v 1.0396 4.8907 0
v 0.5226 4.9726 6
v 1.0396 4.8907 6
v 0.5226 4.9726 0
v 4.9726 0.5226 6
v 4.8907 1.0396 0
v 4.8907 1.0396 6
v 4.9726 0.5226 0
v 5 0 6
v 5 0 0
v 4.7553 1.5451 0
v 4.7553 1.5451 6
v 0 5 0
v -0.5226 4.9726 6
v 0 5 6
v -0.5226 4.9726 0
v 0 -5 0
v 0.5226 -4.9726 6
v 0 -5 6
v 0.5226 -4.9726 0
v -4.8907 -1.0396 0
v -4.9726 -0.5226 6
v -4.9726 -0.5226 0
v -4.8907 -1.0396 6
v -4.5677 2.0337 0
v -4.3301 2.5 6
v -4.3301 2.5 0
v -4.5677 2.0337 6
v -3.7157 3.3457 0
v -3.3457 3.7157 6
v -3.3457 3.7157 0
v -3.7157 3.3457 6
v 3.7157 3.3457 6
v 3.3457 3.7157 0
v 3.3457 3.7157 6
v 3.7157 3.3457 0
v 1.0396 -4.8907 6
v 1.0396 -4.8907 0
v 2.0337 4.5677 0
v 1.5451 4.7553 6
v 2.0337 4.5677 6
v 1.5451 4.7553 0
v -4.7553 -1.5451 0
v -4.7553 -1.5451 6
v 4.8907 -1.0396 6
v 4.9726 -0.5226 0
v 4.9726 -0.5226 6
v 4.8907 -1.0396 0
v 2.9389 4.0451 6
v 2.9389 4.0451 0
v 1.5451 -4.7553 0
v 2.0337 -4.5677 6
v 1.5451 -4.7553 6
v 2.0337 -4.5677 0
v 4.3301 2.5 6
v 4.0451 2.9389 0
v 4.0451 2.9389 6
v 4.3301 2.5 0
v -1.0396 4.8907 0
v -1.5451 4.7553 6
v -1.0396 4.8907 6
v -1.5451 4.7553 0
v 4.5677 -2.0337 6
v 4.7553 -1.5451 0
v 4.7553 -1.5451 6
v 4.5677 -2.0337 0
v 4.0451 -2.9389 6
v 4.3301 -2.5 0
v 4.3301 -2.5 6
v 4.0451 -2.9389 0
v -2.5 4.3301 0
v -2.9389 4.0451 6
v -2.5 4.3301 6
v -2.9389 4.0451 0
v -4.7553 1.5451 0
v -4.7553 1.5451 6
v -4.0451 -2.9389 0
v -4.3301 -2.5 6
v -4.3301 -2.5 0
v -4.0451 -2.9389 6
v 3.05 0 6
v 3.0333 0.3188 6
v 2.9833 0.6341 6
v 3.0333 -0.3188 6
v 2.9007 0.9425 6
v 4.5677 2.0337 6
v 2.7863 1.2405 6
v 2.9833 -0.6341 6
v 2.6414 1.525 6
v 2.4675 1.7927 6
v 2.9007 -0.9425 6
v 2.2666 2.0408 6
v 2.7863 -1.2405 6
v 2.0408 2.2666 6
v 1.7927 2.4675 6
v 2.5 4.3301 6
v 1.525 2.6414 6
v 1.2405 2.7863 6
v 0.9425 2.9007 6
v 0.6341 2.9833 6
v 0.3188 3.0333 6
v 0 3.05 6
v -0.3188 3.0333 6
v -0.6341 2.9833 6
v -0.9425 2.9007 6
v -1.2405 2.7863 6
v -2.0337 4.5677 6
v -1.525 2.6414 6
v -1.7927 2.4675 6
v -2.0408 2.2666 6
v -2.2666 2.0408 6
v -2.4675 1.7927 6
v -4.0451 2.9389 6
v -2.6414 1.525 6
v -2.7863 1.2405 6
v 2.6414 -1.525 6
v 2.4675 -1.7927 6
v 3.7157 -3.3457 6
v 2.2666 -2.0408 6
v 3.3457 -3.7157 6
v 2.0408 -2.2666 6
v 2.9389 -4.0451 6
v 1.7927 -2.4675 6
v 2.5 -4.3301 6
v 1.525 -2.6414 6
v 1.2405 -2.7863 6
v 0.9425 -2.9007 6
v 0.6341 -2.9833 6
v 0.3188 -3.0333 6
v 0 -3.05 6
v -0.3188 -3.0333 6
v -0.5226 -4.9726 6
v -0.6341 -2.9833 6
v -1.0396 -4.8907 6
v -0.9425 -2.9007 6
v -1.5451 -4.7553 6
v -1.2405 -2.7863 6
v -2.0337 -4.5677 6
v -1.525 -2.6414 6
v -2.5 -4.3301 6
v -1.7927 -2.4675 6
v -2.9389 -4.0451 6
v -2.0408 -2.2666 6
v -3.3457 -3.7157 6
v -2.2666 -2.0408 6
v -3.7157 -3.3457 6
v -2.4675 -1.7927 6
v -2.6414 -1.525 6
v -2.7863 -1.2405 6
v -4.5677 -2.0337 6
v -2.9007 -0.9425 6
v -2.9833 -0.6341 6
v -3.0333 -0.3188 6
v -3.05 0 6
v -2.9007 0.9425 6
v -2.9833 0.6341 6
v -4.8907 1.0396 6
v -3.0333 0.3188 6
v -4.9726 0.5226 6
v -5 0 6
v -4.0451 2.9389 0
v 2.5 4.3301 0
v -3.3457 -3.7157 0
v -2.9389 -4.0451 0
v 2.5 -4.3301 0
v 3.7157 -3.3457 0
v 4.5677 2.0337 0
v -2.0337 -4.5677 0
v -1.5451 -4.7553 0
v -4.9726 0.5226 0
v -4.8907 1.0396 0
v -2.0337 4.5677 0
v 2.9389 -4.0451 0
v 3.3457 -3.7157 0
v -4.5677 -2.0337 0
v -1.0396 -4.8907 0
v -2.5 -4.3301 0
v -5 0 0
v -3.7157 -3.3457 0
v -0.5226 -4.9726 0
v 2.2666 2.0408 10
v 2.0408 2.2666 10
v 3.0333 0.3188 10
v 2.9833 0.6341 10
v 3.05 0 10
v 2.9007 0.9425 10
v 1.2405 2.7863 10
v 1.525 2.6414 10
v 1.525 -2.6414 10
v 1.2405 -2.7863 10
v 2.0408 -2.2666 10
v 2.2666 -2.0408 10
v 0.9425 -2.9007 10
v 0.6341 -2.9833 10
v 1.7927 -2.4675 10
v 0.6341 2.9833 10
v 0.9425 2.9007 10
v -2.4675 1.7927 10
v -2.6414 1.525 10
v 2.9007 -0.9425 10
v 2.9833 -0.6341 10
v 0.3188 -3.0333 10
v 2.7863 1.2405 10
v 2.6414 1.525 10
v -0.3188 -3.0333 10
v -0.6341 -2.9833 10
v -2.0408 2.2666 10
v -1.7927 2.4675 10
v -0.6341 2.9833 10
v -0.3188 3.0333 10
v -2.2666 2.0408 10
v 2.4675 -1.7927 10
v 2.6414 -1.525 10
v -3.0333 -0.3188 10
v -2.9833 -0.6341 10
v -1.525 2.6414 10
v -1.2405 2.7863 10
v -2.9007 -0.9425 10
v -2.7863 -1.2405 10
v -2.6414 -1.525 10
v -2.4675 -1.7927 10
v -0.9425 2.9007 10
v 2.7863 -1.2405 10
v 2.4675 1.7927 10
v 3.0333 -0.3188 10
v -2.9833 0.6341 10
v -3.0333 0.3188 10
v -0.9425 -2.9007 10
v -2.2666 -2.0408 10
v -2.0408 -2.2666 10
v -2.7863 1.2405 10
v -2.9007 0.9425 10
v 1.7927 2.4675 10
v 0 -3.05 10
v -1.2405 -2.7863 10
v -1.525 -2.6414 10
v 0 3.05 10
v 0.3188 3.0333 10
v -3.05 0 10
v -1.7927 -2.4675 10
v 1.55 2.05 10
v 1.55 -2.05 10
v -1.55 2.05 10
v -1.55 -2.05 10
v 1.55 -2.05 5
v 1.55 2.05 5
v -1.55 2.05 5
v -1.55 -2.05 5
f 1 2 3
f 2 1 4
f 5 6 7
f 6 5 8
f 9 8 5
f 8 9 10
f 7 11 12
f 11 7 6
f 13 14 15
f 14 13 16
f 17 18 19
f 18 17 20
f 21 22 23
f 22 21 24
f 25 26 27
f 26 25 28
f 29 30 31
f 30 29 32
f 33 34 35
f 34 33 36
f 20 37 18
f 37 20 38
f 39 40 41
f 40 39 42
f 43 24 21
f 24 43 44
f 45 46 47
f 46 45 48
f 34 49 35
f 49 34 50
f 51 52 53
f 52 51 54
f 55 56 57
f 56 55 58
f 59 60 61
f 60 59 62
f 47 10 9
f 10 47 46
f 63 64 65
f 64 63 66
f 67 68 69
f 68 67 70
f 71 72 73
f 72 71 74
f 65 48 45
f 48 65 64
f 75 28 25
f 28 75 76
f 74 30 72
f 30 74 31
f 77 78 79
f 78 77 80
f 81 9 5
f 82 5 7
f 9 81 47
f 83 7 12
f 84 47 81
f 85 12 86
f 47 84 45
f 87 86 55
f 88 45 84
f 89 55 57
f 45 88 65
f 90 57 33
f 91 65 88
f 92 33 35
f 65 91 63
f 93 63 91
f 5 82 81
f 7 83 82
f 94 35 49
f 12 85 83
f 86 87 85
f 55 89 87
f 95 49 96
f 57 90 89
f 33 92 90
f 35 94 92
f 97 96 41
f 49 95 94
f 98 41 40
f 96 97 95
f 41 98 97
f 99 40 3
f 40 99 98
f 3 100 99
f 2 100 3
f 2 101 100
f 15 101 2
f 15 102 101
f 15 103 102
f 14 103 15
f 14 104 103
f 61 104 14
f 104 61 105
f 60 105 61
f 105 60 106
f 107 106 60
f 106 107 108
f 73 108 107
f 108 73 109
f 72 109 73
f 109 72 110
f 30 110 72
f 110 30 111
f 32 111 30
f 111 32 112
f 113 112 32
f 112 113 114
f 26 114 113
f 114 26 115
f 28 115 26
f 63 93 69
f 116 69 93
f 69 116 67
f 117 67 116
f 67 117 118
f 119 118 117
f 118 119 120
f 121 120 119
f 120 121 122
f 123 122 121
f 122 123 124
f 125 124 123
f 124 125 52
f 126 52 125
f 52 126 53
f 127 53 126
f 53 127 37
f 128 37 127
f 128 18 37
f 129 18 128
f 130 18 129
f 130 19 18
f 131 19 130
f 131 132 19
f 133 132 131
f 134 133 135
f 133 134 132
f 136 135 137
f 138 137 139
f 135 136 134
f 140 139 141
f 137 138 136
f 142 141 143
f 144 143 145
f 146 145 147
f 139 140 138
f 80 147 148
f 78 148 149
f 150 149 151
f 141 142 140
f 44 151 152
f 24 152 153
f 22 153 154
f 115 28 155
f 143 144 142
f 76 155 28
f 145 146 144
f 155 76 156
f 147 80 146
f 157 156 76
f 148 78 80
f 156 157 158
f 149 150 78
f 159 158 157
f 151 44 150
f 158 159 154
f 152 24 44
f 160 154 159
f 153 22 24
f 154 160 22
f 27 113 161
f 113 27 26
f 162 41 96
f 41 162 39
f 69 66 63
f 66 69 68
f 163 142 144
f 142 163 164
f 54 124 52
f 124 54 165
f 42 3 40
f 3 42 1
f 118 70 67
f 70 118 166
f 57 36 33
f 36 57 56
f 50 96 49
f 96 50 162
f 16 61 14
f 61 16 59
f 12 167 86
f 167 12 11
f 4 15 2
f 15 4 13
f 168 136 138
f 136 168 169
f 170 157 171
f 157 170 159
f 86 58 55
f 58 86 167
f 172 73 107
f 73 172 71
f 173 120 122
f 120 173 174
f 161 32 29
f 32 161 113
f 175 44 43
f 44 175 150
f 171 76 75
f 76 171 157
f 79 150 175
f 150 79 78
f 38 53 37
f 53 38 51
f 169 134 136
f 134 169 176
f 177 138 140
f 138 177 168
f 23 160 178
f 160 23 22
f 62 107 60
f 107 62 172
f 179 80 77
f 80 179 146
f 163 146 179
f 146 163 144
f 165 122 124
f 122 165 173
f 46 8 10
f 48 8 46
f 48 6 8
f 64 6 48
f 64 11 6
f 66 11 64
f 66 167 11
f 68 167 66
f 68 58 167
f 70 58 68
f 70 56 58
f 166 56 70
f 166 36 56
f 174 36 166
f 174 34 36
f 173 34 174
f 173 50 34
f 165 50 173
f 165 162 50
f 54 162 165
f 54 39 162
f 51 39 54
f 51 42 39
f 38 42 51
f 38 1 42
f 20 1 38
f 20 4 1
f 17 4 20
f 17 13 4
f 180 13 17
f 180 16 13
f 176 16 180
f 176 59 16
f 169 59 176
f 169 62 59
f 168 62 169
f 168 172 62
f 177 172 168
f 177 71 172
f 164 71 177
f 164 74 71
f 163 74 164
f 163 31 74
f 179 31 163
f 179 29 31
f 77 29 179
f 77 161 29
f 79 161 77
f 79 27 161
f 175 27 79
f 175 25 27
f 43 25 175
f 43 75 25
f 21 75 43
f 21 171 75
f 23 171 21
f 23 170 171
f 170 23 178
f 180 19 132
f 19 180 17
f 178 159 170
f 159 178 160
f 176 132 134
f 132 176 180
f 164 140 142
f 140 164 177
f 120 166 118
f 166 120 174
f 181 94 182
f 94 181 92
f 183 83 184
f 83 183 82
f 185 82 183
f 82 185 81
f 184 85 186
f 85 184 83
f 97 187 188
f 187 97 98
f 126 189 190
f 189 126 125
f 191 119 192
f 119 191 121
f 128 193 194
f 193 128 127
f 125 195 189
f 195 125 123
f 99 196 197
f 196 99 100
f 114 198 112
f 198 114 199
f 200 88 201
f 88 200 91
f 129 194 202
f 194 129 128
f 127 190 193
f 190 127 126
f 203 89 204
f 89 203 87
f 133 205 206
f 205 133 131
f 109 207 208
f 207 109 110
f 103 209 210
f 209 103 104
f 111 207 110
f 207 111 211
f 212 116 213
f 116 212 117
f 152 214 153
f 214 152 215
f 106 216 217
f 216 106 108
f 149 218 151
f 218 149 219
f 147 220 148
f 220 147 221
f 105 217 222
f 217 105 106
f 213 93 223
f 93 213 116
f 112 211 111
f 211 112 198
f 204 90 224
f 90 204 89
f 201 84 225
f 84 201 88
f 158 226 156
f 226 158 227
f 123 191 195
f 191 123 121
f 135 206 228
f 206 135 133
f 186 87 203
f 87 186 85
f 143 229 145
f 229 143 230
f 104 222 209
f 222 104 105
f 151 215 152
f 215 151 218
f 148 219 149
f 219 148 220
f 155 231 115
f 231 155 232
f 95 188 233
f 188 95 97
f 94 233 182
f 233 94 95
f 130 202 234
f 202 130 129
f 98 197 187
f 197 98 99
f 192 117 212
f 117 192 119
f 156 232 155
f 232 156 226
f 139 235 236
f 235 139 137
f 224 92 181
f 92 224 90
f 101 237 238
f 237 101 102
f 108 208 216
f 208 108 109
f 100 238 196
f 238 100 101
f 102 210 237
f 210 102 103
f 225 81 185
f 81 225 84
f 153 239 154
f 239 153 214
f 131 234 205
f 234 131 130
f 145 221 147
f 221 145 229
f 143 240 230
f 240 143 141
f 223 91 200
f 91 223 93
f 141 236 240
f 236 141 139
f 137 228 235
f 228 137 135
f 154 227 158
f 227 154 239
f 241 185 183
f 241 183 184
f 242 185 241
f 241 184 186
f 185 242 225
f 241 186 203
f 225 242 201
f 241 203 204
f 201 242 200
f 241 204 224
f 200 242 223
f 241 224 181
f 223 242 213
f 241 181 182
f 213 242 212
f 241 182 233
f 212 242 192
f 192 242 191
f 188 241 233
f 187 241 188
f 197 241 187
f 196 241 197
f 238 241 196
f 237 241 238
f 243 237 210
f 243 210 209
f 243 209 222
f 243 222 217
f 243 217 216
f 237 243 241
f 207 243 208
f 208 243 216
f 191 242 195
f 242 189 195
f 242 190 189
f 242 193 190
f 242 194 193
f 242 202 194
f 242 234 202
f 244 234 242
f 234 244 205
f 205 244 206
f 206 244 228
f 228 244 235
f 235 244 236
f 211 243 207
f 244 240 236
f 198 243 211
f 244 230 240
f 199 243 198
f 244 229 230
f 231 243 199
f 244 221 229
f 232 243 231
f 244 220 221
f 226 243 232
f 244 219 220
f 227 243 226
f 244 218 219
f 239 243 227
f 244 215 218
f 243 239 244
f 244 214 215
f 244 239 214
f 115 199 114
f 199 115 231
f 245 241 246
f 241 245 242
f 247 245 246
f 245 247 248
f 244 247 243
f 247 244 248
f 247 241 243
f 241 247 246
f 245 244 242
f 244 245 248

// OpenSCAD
// file: stick.scad
module stick(stick_height, stick_radius, graft_depth, graft_hole_width, graft_hole_height, graft_hole_depth, graft_wall_size) {
    difference(){
        union(){
            cylinder(h=stick_height, r=stick_radius, $fn=60);
            translate([0, 0, stick_height])
            cylinder(h=graft_depth, r=graft_hole_height/2+graft_wall_size, $fn=60);
        }
        translate([-(graft_hole_width)/2, -(graft_hole_height)/2, stick_height+graft_depth-graft_hole_depth])
        cube([graft_hole_width, graft_hole_height, graft_hole_depth]);
    }
}
// file: measures.scad
pad_diameter = 21;
pad_thickness = 6;
dome_diameter = 27;
dome_height = 8;
graft_hole_width = 3;
graft_hole_height = 4;
stick_height = 6;
stick_radius = 10/2;
graft_depth = 4;
graft_hole_depth = 5;
wall_size = 1;
// main file
include <measures.scad>
include <stick.scad>

stick(stick_height, stick_radius, graft_depth, graft_hole_width+0.1, graft_hole_height+0.1, graft_hole_depth, wall_size);
